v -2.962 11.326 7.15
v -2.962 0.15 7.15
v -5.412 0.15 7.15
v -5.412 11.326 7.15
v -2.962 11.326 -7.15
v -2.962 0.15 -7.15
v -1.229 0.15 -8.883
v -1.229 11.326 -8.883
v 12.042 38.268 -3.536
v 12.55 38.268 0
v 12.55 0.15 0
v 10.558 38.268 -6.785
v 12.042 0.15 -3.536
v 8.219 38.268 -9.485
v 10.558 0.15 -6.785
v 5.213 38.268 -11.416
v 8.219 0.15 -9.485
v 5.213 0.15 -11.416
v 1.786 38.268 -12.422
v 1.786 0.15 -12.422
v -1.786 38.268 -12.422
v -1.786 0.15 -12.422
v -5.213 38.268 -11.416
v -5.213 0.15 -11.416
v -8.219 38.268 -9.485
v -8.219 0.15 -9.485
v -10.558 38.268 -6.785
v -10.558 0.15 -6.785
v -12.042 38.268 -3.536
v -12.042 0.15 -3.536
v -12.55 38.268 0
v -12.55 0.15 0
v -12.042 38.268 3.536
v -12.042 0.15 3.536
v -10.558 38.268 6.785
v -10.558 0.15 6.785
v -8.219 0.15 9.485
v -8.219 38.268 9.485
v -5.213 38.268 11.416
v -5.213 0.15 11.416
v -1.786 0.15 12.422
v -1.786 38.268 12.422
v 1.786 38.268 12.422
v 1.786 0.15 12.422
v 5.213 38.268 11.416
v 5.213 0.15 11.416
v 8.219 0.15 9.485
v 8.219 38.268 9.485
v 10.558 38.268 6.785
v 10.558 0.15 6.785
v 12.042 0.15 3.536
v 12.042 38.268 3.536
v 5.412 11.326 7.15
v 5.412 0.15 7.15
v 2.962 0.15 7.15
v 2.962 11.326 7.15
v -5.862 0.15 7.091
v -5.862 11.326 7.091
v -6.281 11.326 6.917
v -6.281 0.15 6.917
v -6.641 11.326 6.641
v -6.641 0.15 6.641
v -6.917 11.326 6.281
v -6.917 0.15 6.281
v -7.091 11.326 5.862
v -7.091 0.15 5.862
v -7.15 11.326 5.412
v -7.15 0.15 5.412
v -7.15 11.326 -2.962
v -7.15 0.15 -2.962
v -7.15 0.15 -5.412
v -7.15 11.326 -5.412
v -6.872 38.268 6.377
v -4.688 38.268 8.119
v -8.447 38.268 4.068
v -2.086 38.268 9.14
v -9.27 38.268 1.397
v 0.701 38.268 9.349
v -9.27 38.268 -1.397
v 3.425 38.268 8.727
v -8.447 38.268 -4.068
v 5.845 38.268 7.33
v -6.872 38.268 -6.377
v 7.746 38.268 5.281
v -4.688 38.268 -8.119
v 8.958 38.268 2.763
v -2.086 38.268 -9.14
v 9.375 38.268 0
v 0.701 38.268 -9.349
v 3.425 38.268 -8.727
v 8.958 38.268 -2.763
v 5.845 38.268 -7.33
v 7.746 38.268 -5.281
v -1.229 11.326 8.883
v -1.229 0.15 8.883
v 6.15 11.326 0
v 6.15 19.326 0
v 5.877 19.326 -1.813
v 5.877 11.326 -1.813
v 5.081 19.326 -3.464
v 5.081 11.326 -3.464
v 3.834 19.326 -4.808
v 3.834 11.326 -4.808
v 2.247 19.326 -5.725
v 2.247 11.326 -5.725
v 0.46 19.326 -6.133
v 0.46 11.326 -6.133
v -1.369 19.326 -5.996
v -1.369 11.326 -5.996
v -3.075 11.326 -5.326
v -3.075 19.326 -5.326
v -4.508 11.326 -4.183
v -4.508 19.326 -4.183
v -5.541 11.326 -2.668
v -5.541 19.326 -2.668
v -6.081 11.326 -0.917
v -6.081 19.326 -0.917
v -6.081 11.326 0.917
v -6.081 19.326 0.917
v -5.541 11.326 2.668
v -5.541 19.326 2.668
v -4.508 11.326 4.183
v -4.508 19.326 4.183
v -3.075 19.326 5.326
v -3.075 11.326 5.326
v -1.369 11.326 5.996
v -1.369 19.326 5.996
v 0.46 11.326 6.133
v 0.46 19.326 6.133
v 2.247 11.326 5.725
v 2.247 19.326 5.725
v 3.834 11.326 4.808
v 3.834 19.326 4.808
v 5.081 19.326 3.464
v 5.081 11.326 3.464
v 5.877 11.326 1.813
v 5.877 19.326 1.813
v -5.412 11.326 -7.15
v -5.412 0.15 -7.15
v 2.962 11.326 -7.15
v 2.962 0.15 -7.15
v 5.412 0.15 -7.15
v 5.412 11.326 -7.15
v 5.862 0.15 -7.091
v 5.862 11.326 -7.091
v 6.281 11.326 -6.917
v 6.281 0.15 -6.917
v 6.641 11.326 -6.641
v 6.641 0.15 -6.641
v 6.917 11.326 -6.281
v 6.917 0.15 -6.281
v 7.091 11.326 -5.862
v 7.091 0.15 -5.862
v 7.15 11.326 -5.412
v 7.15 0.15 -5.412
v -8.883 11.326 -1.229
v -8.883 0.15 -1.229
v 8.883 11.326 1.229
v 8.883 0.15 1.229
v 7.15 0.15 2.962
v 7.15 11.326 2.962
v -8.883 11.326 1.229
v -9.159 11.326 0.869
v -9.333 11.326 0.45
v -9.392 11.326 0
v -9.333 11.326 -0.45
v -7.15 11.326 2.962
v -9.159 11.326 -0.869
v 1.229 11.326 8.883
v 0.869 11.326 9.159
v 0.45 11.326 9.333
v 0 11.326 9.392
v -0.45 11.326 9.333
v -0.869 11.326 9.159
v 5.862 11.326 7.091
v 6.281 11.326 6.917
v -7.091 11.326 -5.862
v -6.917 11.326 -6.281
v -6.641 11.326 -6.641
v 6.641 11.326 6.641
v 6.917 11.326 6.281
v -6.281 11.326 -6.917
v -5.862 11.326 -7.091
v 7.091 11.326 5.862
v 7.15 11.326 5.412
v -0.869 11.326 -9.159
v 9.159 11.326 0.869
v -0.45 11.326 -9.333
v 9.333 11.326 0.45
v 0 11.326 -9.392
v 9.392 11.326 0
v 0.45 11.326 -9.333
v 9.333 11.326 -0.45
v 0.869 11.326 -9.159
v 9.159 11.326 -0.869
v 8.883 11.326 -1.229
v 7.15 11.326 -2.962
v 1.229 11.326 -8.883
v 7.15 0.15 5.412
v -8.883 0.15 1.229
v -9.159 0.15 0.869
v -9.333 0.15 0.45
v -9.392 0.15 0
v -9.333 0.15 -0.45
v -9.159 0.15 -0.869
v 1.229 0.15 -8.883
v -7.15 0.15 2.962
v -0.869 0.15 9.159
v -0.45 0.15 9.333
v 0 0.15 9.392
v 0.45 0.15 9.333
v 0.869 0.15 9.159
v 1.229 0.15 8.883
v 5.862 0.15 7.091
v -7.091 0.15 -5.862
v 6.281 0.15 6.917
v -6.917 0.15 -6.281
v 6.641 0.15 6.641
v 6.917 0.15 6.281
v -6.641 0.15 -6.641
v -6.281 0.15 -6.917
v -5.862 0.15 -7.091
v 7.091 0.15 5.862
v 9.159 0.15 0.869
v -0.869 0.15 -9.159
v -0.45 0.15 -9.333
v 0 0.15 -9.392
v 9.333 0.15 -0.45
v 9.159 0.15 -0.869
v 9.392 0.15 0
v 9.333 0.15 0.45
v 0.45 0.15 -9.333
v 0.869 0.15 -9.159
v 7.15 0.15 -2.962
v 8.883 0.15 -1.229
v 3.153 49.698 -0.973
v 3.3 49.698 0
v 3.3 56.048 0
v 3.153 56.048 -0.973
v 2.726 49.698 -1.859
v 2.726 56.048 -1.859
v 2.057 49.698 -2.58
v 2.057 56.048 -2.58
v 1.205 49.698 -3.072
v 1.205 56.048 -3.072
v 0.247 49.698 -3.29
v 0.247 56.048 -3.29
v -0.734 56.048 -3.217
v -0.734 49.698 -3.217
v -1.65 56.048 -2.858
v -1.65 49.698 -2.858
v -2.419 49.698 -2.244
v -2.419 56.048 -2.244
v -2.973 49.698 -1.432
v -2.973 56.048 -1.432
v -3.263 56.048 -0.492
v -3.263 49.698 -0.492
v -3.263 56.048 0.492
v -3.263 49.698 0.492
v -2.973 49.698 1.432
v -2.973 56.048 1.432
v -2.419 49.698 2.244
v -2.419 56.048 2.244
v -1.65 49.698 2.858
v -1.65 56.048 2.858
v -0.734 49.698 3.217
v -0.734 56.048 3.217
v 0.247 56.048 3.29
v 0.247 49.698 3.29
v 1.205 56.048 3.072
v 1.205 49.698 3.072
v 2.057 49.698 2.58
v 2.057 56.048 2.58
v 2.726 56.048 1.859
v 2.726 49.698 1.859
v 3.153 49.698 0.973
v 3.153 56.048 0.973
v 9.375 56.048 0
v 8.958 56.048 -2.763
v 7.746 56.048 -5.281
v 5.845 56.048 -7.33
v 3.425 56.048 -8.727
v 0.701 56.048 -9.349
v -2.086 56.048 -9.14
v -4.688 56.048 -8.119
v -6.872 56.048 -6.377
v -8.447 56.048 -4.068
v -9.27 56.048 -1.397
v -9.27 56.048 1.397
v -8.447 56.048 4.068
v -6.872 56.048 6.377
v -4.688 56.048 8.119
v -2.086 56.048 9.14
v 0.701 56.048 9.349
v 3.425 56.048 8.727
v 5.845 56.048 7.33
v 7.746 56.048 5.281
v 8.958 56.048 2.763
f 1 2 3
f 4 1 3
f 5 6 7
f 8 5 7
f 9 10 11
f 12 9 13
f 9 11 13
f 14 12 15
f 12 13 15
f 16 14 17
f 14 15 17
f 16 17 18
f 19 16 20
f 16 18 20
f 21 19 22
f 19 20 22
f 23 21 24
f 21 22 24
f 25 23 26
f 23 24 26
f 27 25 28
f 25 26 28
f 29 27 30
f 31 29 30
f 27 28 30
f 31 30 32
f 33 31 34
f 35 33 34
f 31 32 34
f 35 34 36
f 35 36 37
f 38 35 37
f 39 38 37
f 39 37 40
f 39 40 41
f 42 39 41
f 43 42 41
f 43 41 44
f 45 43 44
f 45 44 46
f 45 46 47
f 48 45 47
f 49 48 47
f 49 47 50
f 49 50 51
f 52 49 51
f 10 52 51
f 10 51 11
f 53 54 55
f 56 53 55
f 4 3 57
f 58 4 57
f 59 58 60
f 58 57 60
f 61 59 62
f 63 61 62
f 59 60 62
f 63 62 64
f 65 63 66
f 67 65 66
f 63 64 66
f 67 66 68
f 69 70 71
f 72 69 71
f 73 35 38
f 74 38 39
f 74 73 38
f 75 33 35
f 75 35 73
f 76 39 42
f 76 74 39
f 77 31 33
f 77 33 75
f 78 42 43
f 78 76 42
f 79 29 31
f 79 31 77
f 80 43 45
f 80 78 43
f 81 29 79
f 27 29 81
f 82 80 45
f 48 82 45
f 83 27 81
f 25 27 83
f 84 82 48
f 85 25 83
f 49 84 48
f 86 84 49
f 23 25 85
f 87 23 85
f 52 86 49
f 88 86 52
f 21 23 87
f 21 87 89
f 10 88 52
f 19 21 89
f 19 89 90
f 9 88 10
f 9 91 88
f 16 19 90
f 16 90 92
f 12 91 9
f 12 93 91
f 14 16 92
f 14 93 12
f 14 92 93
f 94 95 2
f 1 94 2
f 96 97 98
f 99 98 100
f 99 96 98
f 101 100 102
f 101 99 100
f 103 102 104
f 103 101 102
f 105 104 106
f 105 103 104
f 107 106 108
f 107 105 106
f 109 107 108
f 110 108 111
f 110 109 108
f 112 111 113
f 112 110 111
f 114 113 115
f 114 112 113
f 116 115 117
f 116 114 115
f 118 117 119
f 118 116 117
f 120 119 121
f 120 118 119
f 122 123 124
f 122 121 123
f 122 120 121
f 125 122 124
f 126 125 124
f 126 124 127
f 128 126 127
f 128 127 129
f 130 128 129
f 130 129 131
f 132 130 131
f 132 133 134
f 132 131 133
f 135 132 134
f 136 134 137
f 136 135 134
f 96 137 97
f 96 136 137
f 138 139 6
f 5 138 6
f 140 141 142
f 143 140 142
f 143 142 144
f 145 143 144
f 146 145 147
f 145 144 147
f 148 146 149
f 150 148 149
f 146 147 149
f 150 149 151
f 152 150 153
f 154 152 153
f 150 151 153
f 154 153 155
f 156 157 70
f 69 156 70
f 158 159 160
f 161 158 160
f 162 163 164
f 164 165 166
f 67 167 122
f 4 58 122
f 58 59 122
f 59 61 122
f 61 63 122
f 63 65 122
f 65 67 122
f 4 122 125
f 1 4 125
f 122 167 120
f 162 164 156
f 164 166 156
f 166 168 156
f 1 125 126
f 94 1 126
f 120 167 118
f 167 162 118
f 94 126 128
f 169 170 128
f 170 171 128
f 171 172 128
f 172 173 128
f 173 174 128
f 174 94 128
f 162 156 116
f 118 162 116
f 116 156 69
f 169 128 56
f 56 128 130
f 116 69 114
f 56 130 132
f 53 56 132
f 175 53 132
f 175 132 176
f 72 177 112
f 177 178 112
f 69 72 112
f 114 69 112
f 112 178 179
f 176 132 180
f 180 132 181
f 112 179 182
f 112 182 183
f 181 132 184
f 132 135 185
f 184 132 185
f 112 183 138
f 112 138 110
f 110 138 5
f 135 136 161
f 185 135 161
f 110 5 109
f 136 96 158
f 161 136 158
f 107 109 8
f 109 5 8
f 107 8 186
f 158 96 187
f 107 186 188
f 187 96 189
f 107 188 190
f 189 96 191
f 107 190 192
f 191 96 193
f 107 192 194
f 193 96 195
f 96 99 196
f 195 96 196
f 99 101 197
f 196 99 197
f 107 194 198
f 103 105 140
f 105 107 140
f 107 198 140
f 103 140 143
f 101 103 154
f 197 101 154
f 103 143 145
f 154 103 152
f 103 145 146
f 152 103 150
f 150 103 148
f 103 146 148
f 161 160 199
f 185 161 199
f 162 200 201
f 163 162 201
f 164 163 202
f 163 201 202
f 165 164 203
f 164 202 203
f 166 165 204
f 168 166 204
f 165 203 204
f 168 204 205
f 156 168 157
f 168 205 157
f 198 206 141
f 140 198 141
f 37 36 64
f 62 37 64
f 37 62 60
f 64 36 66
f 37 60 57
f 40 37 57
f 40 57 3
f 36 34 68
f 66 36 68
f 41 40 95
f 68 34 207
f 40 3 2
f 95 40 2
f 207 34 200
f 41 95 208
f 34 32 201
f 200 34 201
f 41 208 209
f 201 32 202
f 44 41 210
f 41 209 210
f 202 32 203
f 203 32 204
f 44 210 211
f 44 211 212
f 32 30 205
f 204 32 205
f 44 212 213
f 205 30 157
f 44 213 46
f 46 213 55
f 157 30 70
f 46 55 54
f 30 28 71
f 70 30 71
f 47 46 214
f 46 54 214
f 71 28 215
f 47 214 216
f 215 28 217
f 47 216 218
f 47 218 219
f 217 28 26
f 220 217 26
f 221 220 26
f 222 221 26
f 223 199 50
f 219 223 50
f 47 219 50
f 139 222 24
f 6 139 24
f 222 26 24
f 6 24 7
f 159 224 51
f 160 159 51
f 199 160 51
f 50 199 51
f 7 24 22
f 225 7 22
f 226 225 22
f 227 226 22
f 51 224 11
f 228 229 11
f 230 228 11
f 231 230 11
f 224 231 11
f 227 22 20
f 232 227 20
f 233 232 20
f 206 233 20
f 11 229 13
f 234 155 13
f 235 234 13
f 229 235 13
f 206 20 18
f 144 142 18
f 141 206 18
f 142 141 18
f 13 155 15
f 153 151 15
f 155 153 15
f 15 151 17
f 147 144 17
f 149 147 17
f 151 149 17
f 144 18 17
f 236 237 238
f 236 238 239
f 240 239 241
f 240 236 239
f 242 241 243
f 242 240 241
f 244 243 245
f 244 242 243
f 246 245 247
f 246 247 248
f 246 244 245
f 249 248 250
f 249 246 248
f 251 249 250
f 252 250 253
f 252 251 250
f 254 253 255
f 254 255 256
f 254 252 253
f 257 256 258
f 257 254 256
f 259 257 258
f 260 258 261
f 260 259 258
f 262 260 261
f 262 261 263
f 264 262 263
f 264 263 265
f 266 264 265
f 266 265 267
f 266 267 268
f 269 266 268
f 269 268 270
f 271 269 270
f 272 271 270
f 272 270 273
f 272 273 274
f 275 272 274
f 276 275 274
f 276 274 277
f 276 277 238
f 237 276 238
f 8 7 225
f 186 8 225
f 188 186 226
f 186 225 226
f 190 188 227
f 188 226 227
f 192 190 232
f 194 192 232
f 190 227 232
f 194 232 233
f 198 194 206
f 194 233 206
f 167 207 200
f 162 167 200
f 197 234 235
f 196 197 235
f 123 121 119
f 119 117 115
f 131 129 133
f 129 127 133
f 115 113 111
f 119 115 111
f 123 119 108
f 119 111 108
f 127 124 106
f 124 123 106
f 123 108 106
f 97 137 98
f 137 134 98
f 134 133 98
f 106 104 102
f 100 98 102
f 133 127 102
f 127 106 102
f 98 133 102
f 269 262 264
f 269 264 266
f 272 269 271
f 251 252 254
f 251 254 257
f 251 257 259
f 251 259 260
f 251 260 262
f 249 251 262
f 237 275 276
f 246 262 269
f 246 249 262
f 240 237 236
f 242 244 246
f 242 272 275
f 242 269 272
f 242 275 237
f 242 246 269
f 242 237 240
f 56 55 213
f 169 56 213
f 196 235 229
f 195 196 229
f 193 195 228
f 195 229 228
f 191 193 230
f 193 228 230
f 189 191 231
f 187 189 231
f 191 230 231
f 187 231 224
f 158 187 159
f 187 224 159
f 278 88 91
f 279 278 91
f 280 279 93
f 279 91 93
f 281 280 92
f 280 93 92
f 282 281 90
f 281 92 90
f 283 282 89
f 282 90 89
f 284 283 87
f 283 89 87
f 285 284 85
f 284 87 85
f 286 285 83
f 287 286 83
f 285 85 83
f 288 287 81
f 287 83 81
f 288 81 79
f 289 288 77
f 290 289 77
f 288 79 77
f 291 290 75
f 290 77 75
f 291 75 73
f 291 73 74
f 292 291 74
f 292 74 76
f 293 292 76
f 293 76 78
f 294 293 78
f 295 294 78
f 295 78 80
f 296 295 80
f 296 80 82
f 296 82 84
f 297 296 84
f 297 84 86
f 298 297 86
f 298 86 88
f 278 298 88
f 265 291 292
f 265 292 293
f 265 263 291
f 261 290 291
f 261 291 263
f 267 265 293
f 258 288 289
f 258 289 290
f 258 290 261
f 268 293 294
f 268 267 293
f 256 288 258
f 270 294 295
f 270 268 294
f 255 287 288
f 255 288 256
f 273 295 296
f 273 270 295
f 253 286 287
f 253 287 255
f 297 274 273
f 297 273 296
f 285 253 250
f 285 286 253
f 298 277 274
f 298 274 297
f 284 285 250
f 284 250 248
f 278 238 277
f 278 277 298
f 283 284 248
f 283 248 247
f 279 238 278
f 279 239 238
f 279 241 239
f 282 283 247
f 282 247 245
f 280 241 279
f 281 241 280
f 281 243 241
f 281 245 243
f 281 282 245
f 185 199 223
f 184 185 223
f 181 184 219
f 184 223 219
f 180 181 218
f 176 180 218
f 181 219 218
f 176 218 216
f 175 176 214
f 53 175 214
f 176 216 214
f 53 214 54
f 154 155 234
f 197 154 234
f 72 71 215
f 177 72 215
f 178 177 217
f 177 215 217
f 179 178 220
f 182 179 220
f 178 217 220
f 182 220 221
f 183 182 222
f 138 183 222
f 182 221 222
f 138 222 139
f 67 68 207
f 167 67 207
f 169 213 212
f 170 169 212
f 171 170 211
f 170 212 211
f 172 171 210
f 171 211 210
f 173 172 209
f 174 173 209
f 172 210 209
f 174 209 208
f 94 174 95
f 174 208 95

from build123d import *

# Parameters (mm, degrees)
SKETCH1_R            = 12.7
BOSS_EXTRUDE1_DEPTH  = 38.4175
SKETCH4_R            = 9.525
BOSS_EXTRUDE2_DEPTH  = 17.78
CUT_EXTRUDE1_DEPTH   = 11.176
SKETCH3_R            = 6
CUT_EXTRUDE2_DEPTH   = 8
SKETCH6_R            = 3.1496
CUT_EXTRUDE3_DEPTH   = 6.35
SPLIT1_START         = 11.325999954
SPLIT1_OUTLINE_R     = 12.550000046
SPLIT1_OUTLINE_R_2   = 6.149999954
SPLIT1_DEPTH         = 26.941500092
SPLIT1_START_2       = 19.325999954
SPLIT1_2_OUTLINE_R   = 9.375000046
SPLIT1_2_OUTLINE_R_2 = 3.299599954
SPLIT1_2_DEPTH       = 36.721500092
SPLIT1_START_3       = 0.149999954
SPLIT1_3_OUTLINE_R   = 12.550000046
SPLIT1_3_DEPTH       = 11.176
SPLIT1_4_OUTLINE_R   = 3.299599954
SPLIT1_4_DEPTH       = 30.371500092
SPLIT1_5_OUTLINE_R   = 12.550000046
SPLIT1_5_OUTLINE_R_2 = 6.149999954
SPLIT1_5_DEPTH       = 26.941500092
SPLIT1_6_OUTLINE_R   = 9.375000046
SPLIT1_6_OUTLINE_R_2 = 3.299599954
SPLIT1_6_DEPTH       = 36.721500092
SPLIT1_7_OUTLINE_R   = 12.550000046
SPLIT1_7_DEPTH       = 11.176
SPLIT1_8_OUTLINE_R   = 3.299599954
SPLIT1_8_DEPTH       = 30.371500092


with BuildPart() as part:
    # Sketch1 → Boss-Extrude1 (new body)
    with BuildSketch(Plane(origin=(0, 0, 0), x_dir=(1, 0, 0), z_dir=(0, 1, 0))):
        with Locations(Location((0, 0, 0), (0, 0, 270))):
            Circle(SKETCH1_R)
    extrude(amount=BOSS_EXTRUDE1_DEPTH)

    # Sketch4 → Boss-Extrude2 (add)
    with BuildSketch(Plane(origin=(0, 38.4175, 0), x_dir=(1, 0, 0), z_dir=(0, 1, 0))):
        with Locations(Location((0, 0, 0), (0, 0, 270))):
            Circle(SKETCH4_R)
    extrude(amount=BOSS_EXTRUDE2_DEPTH)

    # Sketch2 → Cut-Extrude1 (cut)
    with BuildSketch(Plane.XZ):
        with BuildLine():
            Line((-7, 2.899494937), (-8.776962921, 1.122532015))
            ThreePointArc((-8.776962921, 1.122532015), (-9.241930906, 0), (-8.776962921, -1.122532015))
            Line((-8.776962921, -1.122532015), (-7, -2.899494937))
            Line((-7, -2.899494937), (-7, 2.899494937))
        make_face()
        Polygon((-2.899494937, 7), (-7, 2.899494937), (-7, -2.899494937), (-2.899494937, -7), (2.899494937, -7), (7, -2.899494937), (7, 2.899494937), (2.899494937, 7), align=None)
        with BuildLine():
            Line((-7, 5.4125), (-7, 2.899494937))
            Line((-7, 2.899494937), (-2.899494937, 7))
            Line((-2.899494937, 7), (-5.4125, 7))
            ThreePointArc((-5.4125, 7), (-6.535032015, 6.535032015), (-7, 5.4125))
        make_face()
        with BuildLine():
            Line((-1.122532015, 8.776962921), (-2.899494937, 7))
            Line((-2.899494937, 7), (2.899494937, 7))
            Line((2.899494937, 7), (1.122532015, 8.776962921))
            ThreePointArc((1.122532015, 8.776962921), (0, 9.241930906), (-1.122532015, 8.776962921))
        make_face()
        with BuildLine():
            Line((5.4125, 7), (2.899494937, 7))
            Line((2.899494937, 7), (7, 2.899494937))
            Line((7, 2.899494937), (7, 5.4125))
            ThreePointArc((7, 5.4125), (6.535032015, 6.535032015), (5.4125, 7))
        make_face()
        with BuildLine():
            Line((8.776962921, 1.122532015), (7, 2.899494937))
            Line((7, 2.899494937), (7, -2.899494937))
            Line((7, -2.899494937), (8.776962921, -1.122532015))
            ThreePointArc((8.776962921, -1.122532015), (9.241930906, 0), (8.776962921, 1.122532015))
        make_face()
        with BuildLine():
            Line((7, -2.899494937), (2.899494937, -7))
            Line((2.899494937, -7), (5.4125, -7))
            ThreePointArc((5.4125, -7), (6.535032015, -6.535032015), (7, -5.4125))
            Line((7, -5.4125), (7, -2.899494937))
        make_face()
        with BuildLine():
            Line((2.899494937, -7), (-2.899494937, -7))
            Line((-2.899494937, -7), (-1.122532015, -8.776962921))
            ThreePointArc((-1.122532015, -8.776962921), (0, -9.241930906), (1.122532015, -8.776962921))
            Line((1.122532015, -8.776962921), (2.899494937, -7))
        make_face()
        with BuildLine():
            Line((-2.899494937, -7), (-7, -2.899494937))
            Line((-7, -2.899494937), (-7, -5.4125))
            ThreePointArc((-7, -5.4125), (-6.535032015, -6.535032015), (-5.4125, -7))
            Line((-5.4125, -7), (-2.899494937, -7))
        make_face()
    extrude(amount=-CUT_EXTRUDE1_DEPTH, mode=Mode.SUBTRACT)

    # Sketch3 → Cut-Extrude2 (cut)
    with BuildSketch(Plane.XZ.offset(-11.176)):
        with Locations(Location((0, 0, 0), (0, 0, 270))):
            Circle(SKETCH3_R)
    extrude(amount=-CUT_EXTRUDE2_DEPTH, mode=Mode.SUBTRACT)

    # Sketch6 → Cut-Extrude3 (cut)
    with BuildSketch(Plane(origin=(0, 56.1975, 0), x_dir=(1, 0, 0), z_dir=(0, 1, 0))):
        with Locations(Location((0, 0, 0), (0, 0, 270))):
            Circle(SKETCH6_R)
    extrude(amount=-CUT_EXTRUDE3_DEPTH, mode=Mode.SUBTRACT)

    # Split1 5 outline → Split1 5 (cut)
    with BuildSketch(Plane(origin=(0, 0, 0), x_dir=(1, 0, 0), z_dir=(0, 1, 0)).offset(SPLIT1_START)):
        Circle(SPLIT1_5_OUTLINE_R)
        Circle(SPLIT1_5_OUTLINE_R_2, mode=Mode.SUBTRACT)
    extrude(amount=SPLIT1_5_DEPTH, mode=Mode.SUBTRACT)

    # Split1 6 outline → Split1 6 (cut)
    with BuildSketch(Plane(origin=(0, 0, 0), x_dir=(1, 0, 0), z_dir=(0, 1, 0)).offset(SPLIT1_START_2)):
        Circle(SPLIT1_6_OUTLINE_R)
        Circle(SPLIT1_6_OUTLINE_R_2, mode=Mode.SUBTRACT)
    extrude(amount=SPLIT1_6_DEPTH, mode=Mode.SUBTRACT)

    # Split1 7 outline → Split1 7 (cut)
    with BuildSketch(Plane(origin=(0, 0, 0), x_dir=(1, 0, 0), z_dir=(0, 1, 0)).offset(SPLIT1_START_3)):
        Circle(SPLIT1_7_OUTLINE_R)
        with BuildLine():
            Line((-7.149999954, -2.961626952), (-8.883028906, -1.228598))
            ThreePointArc((-8.883028906, -1.228598), (-9.39193086, 0), (-8.883028906, 1.228598))
            Line((-8.883028906, 1.228598), (-7.149999954, 2.961626952))
            Line((-7.149999954, 2.961626952), (-7.149999954, 5.4125))
            ThreePointArc((-7.149999954, 5.4125), (-6.641098, 6.641098), (-5.4125, 7.149999954))
            Line((-5.4125, 7.149999954), (-2.961626952, 7.149999954))
            Line((-2.961626952, 7.149999954), (-1.228598, 8.883028906))
            ThreePointArc((-1.228598, 8.883028906), (0, 9.39193086), (1.228598, 8.883028906))
            Line((1.228598, 8.883028906), (2.961626952, 7.149999954))
            Line((2.961626952, 7.149999954), (5.4125, 7.149999954))
            ThreePointArc((5.4125, 7.149999954), (6.641098, 6.641098), (7.149999954, 5.4125))
            Line((7.149999954, 5.4125), (7.149999954, 2.961626952))
            Line((7.149999954, 2.961626952), (8.883028906, 1.228598))
            ThreePointArc((8.883028906, 1.228598), (9.39193086, 0), (8.883028906, -1.228598))
            Line((8.883028906, -1.228598), (7.149999954, -2.961626952))
            Line((7.149999954, -2.961626952), (7.149999954, -5.4125))
            ThreePointArc((7.149999954, -5.4125), (6.641098, -6.641098), (5.4125, -7.149999954))
            Line((5.4125, -7.149999954), (2.961626952, -7.149999954))
            Line((2.961626952, -7.149999954), (1.228598, -8.883028906))
            ThreePointArc((1.228598, -8.883028906), (0, -9.39193086), (-1.228598, -8.883028906))
            Line((-1.228598, -8.883028906), (-2.961626952, -7.149999954))
            Line((-2.961626952, -7.149999954), (-5.4125, -7.149999954))
            ThreePointArc((-5.4125, -7.149999954), (-6.641098, -6.641098), (-7.149999954, -5.4125))
            Line((-7.149999954, -5.4125), (-7.149999954, -2.961626952))
        make_face(mode=Mode.SUBTRACT)
    extrude(amount=SPLIT1_7_DEPTH, mode=Mode.SUBTRACT)

    # Split1 8 outline → Split1 8 (cut)
    with BuildSketch(Plane(origin=(0, 0, 0), x_dir=(1, 0, 0), z_dir=(0, 1, 0)).offset(SPLIT1_START_2)):
        Circle(SPLIT1_8_OUTLINE_R)
    extrude(amount=SPLIT1_8_DEPTH, mode=Mode.SUBTRACT)


with BuildPart() as body_2:
    # Split1: read off the stored shape, not the designer's step
    # Split1 outline → Split1 (new body)
    with BuildSketch(Plane(origin=(0, 0, 0), x_dir=(1, 0, 0), z_dir=(0, 1, 0)).offset(SPLIT1_START)):
        Circle(SPLIT1_OUTLINE_R)
        Circle(SPLIT1_OUTLINE_R_2, mode=Mode.SUBTRACT)
    extrude(amount=SPLIT1_DEPTH)

    # Split1 2 outline → Split1 2 (add)
    with BuildSketch(Plane(origin=(0, 0, 0), x_dir=(1, 0, 0), z_dir=(0, 1, 0)).offset(SPLIT1_START_2)):
        Circle(SPLIT1_2_OUTLINE_R)
        Circle(SPLIT1_2_OUTLINE_R_2, mode=Mode.SUBTRACT)
    extrude(amount=SPLIT1_2_DEPTH)

    # Split1 3 outline → Split1 3 (add)
    with BuildSketch(Plane(origin=(0, 0, 0), x_dir=(1, 0, 0), z_dir=(0, 1, 0)).offset(SPLIT1_START_3)):
        Circle(SPLIT1_3_OUTLINE_R)
        with BuildLine():
            Line((7.149999954, 5.4125), (7.149999954, 2.961626952))
            Line((7.149999954, 2.961626952), (8.883028906, 1.228598))
            ThreePointArc((8.883028906, 1.228598), (9.39193086, 0), (8.883028906, -1.228598))
            Line((8.883028906, -1.228598), (7.149999954, -2.961626952))
            Line((7.149999954, -2.961626952), (7.149999954, -5.4125))
            ThreePointArc((7.149999954, -5.4125), (6.641098, -6.641098), (5.4125, -7.149999954))
            Line((5.4125, -7.149999954), (2.961626952, -7.149999954))
            Line((2.961626952, -7.149999954), (1.228598, -8.883028906))
            ThreePointArc((1.228598, -8.883028906), (0, -9.39193086), (-1.228598, -8.883028906))
            Line((-1.228598, -8.883028906), (-2.961626952, -7.149999954))
            Line((-2.961626952, -7.149999954), (-5.4125, -7.149999954))
            ThreePointArc((-5.4125, -7.149999954), (-6.641098, -6.641098), (-7.149999954, -5.4125))
            Line((-7.149999954, -5.4125), (-7.149999954, -2.961626952))
            Line((-7.149999954, -2.961626952), (-8.883028906, -1.228598))
            ThreePointArc((-8.883028906, -1.228598), (-9.39193086, 0), (-8.883028906, 1.228598))
            Line((-8.883028906, 1.228598), (-7.149999954, 2.961626952))
            Line((-7.149999954, 2.961626952), (-7.149999954, 5.4125))
            ThreePointArc((-7.149999954, 5.4125), (-6.641098, 6.641098), (-5.4125, 7.149999954))
            Line((-5.4125, 7.149999954), (-2.961626952, 7.149999954))
            Line((-2.961626952, 7.149999954), (-1.228598, 8.883028906))
            ThreePointArc((-1.228598, 8.883028906), (0, 9.39193086), (1.228598, 8.883028906))
            Line((1.228598, 8.883028906), (2.961626952, 7.149999954))
            Line((2.961626952, 7.149999954), (5.4125, 7.149999954))
            ThreePointArc((5.4125, 7.149999954), (6.641098, 6.641098), (7.149999954, 5.4125))
        make_face(mode=Mode.SUBTRACT)
    extrude(amount=SPLIT1_3_DEPTH)

    # Split1 4 outline → Split1 4 (add)
    with BuildSketch(Plane(origin=(0, 0, 0), x_dir=(1, 0, 0), z_dir=(0, 1, 0)).offset(SPLIT1_START_2)):
        Circle(SPLIT1_4_OUTLINE_R)
    extrude(amount=SPLIT1_4_DEPTH)


solid = body_2.part
